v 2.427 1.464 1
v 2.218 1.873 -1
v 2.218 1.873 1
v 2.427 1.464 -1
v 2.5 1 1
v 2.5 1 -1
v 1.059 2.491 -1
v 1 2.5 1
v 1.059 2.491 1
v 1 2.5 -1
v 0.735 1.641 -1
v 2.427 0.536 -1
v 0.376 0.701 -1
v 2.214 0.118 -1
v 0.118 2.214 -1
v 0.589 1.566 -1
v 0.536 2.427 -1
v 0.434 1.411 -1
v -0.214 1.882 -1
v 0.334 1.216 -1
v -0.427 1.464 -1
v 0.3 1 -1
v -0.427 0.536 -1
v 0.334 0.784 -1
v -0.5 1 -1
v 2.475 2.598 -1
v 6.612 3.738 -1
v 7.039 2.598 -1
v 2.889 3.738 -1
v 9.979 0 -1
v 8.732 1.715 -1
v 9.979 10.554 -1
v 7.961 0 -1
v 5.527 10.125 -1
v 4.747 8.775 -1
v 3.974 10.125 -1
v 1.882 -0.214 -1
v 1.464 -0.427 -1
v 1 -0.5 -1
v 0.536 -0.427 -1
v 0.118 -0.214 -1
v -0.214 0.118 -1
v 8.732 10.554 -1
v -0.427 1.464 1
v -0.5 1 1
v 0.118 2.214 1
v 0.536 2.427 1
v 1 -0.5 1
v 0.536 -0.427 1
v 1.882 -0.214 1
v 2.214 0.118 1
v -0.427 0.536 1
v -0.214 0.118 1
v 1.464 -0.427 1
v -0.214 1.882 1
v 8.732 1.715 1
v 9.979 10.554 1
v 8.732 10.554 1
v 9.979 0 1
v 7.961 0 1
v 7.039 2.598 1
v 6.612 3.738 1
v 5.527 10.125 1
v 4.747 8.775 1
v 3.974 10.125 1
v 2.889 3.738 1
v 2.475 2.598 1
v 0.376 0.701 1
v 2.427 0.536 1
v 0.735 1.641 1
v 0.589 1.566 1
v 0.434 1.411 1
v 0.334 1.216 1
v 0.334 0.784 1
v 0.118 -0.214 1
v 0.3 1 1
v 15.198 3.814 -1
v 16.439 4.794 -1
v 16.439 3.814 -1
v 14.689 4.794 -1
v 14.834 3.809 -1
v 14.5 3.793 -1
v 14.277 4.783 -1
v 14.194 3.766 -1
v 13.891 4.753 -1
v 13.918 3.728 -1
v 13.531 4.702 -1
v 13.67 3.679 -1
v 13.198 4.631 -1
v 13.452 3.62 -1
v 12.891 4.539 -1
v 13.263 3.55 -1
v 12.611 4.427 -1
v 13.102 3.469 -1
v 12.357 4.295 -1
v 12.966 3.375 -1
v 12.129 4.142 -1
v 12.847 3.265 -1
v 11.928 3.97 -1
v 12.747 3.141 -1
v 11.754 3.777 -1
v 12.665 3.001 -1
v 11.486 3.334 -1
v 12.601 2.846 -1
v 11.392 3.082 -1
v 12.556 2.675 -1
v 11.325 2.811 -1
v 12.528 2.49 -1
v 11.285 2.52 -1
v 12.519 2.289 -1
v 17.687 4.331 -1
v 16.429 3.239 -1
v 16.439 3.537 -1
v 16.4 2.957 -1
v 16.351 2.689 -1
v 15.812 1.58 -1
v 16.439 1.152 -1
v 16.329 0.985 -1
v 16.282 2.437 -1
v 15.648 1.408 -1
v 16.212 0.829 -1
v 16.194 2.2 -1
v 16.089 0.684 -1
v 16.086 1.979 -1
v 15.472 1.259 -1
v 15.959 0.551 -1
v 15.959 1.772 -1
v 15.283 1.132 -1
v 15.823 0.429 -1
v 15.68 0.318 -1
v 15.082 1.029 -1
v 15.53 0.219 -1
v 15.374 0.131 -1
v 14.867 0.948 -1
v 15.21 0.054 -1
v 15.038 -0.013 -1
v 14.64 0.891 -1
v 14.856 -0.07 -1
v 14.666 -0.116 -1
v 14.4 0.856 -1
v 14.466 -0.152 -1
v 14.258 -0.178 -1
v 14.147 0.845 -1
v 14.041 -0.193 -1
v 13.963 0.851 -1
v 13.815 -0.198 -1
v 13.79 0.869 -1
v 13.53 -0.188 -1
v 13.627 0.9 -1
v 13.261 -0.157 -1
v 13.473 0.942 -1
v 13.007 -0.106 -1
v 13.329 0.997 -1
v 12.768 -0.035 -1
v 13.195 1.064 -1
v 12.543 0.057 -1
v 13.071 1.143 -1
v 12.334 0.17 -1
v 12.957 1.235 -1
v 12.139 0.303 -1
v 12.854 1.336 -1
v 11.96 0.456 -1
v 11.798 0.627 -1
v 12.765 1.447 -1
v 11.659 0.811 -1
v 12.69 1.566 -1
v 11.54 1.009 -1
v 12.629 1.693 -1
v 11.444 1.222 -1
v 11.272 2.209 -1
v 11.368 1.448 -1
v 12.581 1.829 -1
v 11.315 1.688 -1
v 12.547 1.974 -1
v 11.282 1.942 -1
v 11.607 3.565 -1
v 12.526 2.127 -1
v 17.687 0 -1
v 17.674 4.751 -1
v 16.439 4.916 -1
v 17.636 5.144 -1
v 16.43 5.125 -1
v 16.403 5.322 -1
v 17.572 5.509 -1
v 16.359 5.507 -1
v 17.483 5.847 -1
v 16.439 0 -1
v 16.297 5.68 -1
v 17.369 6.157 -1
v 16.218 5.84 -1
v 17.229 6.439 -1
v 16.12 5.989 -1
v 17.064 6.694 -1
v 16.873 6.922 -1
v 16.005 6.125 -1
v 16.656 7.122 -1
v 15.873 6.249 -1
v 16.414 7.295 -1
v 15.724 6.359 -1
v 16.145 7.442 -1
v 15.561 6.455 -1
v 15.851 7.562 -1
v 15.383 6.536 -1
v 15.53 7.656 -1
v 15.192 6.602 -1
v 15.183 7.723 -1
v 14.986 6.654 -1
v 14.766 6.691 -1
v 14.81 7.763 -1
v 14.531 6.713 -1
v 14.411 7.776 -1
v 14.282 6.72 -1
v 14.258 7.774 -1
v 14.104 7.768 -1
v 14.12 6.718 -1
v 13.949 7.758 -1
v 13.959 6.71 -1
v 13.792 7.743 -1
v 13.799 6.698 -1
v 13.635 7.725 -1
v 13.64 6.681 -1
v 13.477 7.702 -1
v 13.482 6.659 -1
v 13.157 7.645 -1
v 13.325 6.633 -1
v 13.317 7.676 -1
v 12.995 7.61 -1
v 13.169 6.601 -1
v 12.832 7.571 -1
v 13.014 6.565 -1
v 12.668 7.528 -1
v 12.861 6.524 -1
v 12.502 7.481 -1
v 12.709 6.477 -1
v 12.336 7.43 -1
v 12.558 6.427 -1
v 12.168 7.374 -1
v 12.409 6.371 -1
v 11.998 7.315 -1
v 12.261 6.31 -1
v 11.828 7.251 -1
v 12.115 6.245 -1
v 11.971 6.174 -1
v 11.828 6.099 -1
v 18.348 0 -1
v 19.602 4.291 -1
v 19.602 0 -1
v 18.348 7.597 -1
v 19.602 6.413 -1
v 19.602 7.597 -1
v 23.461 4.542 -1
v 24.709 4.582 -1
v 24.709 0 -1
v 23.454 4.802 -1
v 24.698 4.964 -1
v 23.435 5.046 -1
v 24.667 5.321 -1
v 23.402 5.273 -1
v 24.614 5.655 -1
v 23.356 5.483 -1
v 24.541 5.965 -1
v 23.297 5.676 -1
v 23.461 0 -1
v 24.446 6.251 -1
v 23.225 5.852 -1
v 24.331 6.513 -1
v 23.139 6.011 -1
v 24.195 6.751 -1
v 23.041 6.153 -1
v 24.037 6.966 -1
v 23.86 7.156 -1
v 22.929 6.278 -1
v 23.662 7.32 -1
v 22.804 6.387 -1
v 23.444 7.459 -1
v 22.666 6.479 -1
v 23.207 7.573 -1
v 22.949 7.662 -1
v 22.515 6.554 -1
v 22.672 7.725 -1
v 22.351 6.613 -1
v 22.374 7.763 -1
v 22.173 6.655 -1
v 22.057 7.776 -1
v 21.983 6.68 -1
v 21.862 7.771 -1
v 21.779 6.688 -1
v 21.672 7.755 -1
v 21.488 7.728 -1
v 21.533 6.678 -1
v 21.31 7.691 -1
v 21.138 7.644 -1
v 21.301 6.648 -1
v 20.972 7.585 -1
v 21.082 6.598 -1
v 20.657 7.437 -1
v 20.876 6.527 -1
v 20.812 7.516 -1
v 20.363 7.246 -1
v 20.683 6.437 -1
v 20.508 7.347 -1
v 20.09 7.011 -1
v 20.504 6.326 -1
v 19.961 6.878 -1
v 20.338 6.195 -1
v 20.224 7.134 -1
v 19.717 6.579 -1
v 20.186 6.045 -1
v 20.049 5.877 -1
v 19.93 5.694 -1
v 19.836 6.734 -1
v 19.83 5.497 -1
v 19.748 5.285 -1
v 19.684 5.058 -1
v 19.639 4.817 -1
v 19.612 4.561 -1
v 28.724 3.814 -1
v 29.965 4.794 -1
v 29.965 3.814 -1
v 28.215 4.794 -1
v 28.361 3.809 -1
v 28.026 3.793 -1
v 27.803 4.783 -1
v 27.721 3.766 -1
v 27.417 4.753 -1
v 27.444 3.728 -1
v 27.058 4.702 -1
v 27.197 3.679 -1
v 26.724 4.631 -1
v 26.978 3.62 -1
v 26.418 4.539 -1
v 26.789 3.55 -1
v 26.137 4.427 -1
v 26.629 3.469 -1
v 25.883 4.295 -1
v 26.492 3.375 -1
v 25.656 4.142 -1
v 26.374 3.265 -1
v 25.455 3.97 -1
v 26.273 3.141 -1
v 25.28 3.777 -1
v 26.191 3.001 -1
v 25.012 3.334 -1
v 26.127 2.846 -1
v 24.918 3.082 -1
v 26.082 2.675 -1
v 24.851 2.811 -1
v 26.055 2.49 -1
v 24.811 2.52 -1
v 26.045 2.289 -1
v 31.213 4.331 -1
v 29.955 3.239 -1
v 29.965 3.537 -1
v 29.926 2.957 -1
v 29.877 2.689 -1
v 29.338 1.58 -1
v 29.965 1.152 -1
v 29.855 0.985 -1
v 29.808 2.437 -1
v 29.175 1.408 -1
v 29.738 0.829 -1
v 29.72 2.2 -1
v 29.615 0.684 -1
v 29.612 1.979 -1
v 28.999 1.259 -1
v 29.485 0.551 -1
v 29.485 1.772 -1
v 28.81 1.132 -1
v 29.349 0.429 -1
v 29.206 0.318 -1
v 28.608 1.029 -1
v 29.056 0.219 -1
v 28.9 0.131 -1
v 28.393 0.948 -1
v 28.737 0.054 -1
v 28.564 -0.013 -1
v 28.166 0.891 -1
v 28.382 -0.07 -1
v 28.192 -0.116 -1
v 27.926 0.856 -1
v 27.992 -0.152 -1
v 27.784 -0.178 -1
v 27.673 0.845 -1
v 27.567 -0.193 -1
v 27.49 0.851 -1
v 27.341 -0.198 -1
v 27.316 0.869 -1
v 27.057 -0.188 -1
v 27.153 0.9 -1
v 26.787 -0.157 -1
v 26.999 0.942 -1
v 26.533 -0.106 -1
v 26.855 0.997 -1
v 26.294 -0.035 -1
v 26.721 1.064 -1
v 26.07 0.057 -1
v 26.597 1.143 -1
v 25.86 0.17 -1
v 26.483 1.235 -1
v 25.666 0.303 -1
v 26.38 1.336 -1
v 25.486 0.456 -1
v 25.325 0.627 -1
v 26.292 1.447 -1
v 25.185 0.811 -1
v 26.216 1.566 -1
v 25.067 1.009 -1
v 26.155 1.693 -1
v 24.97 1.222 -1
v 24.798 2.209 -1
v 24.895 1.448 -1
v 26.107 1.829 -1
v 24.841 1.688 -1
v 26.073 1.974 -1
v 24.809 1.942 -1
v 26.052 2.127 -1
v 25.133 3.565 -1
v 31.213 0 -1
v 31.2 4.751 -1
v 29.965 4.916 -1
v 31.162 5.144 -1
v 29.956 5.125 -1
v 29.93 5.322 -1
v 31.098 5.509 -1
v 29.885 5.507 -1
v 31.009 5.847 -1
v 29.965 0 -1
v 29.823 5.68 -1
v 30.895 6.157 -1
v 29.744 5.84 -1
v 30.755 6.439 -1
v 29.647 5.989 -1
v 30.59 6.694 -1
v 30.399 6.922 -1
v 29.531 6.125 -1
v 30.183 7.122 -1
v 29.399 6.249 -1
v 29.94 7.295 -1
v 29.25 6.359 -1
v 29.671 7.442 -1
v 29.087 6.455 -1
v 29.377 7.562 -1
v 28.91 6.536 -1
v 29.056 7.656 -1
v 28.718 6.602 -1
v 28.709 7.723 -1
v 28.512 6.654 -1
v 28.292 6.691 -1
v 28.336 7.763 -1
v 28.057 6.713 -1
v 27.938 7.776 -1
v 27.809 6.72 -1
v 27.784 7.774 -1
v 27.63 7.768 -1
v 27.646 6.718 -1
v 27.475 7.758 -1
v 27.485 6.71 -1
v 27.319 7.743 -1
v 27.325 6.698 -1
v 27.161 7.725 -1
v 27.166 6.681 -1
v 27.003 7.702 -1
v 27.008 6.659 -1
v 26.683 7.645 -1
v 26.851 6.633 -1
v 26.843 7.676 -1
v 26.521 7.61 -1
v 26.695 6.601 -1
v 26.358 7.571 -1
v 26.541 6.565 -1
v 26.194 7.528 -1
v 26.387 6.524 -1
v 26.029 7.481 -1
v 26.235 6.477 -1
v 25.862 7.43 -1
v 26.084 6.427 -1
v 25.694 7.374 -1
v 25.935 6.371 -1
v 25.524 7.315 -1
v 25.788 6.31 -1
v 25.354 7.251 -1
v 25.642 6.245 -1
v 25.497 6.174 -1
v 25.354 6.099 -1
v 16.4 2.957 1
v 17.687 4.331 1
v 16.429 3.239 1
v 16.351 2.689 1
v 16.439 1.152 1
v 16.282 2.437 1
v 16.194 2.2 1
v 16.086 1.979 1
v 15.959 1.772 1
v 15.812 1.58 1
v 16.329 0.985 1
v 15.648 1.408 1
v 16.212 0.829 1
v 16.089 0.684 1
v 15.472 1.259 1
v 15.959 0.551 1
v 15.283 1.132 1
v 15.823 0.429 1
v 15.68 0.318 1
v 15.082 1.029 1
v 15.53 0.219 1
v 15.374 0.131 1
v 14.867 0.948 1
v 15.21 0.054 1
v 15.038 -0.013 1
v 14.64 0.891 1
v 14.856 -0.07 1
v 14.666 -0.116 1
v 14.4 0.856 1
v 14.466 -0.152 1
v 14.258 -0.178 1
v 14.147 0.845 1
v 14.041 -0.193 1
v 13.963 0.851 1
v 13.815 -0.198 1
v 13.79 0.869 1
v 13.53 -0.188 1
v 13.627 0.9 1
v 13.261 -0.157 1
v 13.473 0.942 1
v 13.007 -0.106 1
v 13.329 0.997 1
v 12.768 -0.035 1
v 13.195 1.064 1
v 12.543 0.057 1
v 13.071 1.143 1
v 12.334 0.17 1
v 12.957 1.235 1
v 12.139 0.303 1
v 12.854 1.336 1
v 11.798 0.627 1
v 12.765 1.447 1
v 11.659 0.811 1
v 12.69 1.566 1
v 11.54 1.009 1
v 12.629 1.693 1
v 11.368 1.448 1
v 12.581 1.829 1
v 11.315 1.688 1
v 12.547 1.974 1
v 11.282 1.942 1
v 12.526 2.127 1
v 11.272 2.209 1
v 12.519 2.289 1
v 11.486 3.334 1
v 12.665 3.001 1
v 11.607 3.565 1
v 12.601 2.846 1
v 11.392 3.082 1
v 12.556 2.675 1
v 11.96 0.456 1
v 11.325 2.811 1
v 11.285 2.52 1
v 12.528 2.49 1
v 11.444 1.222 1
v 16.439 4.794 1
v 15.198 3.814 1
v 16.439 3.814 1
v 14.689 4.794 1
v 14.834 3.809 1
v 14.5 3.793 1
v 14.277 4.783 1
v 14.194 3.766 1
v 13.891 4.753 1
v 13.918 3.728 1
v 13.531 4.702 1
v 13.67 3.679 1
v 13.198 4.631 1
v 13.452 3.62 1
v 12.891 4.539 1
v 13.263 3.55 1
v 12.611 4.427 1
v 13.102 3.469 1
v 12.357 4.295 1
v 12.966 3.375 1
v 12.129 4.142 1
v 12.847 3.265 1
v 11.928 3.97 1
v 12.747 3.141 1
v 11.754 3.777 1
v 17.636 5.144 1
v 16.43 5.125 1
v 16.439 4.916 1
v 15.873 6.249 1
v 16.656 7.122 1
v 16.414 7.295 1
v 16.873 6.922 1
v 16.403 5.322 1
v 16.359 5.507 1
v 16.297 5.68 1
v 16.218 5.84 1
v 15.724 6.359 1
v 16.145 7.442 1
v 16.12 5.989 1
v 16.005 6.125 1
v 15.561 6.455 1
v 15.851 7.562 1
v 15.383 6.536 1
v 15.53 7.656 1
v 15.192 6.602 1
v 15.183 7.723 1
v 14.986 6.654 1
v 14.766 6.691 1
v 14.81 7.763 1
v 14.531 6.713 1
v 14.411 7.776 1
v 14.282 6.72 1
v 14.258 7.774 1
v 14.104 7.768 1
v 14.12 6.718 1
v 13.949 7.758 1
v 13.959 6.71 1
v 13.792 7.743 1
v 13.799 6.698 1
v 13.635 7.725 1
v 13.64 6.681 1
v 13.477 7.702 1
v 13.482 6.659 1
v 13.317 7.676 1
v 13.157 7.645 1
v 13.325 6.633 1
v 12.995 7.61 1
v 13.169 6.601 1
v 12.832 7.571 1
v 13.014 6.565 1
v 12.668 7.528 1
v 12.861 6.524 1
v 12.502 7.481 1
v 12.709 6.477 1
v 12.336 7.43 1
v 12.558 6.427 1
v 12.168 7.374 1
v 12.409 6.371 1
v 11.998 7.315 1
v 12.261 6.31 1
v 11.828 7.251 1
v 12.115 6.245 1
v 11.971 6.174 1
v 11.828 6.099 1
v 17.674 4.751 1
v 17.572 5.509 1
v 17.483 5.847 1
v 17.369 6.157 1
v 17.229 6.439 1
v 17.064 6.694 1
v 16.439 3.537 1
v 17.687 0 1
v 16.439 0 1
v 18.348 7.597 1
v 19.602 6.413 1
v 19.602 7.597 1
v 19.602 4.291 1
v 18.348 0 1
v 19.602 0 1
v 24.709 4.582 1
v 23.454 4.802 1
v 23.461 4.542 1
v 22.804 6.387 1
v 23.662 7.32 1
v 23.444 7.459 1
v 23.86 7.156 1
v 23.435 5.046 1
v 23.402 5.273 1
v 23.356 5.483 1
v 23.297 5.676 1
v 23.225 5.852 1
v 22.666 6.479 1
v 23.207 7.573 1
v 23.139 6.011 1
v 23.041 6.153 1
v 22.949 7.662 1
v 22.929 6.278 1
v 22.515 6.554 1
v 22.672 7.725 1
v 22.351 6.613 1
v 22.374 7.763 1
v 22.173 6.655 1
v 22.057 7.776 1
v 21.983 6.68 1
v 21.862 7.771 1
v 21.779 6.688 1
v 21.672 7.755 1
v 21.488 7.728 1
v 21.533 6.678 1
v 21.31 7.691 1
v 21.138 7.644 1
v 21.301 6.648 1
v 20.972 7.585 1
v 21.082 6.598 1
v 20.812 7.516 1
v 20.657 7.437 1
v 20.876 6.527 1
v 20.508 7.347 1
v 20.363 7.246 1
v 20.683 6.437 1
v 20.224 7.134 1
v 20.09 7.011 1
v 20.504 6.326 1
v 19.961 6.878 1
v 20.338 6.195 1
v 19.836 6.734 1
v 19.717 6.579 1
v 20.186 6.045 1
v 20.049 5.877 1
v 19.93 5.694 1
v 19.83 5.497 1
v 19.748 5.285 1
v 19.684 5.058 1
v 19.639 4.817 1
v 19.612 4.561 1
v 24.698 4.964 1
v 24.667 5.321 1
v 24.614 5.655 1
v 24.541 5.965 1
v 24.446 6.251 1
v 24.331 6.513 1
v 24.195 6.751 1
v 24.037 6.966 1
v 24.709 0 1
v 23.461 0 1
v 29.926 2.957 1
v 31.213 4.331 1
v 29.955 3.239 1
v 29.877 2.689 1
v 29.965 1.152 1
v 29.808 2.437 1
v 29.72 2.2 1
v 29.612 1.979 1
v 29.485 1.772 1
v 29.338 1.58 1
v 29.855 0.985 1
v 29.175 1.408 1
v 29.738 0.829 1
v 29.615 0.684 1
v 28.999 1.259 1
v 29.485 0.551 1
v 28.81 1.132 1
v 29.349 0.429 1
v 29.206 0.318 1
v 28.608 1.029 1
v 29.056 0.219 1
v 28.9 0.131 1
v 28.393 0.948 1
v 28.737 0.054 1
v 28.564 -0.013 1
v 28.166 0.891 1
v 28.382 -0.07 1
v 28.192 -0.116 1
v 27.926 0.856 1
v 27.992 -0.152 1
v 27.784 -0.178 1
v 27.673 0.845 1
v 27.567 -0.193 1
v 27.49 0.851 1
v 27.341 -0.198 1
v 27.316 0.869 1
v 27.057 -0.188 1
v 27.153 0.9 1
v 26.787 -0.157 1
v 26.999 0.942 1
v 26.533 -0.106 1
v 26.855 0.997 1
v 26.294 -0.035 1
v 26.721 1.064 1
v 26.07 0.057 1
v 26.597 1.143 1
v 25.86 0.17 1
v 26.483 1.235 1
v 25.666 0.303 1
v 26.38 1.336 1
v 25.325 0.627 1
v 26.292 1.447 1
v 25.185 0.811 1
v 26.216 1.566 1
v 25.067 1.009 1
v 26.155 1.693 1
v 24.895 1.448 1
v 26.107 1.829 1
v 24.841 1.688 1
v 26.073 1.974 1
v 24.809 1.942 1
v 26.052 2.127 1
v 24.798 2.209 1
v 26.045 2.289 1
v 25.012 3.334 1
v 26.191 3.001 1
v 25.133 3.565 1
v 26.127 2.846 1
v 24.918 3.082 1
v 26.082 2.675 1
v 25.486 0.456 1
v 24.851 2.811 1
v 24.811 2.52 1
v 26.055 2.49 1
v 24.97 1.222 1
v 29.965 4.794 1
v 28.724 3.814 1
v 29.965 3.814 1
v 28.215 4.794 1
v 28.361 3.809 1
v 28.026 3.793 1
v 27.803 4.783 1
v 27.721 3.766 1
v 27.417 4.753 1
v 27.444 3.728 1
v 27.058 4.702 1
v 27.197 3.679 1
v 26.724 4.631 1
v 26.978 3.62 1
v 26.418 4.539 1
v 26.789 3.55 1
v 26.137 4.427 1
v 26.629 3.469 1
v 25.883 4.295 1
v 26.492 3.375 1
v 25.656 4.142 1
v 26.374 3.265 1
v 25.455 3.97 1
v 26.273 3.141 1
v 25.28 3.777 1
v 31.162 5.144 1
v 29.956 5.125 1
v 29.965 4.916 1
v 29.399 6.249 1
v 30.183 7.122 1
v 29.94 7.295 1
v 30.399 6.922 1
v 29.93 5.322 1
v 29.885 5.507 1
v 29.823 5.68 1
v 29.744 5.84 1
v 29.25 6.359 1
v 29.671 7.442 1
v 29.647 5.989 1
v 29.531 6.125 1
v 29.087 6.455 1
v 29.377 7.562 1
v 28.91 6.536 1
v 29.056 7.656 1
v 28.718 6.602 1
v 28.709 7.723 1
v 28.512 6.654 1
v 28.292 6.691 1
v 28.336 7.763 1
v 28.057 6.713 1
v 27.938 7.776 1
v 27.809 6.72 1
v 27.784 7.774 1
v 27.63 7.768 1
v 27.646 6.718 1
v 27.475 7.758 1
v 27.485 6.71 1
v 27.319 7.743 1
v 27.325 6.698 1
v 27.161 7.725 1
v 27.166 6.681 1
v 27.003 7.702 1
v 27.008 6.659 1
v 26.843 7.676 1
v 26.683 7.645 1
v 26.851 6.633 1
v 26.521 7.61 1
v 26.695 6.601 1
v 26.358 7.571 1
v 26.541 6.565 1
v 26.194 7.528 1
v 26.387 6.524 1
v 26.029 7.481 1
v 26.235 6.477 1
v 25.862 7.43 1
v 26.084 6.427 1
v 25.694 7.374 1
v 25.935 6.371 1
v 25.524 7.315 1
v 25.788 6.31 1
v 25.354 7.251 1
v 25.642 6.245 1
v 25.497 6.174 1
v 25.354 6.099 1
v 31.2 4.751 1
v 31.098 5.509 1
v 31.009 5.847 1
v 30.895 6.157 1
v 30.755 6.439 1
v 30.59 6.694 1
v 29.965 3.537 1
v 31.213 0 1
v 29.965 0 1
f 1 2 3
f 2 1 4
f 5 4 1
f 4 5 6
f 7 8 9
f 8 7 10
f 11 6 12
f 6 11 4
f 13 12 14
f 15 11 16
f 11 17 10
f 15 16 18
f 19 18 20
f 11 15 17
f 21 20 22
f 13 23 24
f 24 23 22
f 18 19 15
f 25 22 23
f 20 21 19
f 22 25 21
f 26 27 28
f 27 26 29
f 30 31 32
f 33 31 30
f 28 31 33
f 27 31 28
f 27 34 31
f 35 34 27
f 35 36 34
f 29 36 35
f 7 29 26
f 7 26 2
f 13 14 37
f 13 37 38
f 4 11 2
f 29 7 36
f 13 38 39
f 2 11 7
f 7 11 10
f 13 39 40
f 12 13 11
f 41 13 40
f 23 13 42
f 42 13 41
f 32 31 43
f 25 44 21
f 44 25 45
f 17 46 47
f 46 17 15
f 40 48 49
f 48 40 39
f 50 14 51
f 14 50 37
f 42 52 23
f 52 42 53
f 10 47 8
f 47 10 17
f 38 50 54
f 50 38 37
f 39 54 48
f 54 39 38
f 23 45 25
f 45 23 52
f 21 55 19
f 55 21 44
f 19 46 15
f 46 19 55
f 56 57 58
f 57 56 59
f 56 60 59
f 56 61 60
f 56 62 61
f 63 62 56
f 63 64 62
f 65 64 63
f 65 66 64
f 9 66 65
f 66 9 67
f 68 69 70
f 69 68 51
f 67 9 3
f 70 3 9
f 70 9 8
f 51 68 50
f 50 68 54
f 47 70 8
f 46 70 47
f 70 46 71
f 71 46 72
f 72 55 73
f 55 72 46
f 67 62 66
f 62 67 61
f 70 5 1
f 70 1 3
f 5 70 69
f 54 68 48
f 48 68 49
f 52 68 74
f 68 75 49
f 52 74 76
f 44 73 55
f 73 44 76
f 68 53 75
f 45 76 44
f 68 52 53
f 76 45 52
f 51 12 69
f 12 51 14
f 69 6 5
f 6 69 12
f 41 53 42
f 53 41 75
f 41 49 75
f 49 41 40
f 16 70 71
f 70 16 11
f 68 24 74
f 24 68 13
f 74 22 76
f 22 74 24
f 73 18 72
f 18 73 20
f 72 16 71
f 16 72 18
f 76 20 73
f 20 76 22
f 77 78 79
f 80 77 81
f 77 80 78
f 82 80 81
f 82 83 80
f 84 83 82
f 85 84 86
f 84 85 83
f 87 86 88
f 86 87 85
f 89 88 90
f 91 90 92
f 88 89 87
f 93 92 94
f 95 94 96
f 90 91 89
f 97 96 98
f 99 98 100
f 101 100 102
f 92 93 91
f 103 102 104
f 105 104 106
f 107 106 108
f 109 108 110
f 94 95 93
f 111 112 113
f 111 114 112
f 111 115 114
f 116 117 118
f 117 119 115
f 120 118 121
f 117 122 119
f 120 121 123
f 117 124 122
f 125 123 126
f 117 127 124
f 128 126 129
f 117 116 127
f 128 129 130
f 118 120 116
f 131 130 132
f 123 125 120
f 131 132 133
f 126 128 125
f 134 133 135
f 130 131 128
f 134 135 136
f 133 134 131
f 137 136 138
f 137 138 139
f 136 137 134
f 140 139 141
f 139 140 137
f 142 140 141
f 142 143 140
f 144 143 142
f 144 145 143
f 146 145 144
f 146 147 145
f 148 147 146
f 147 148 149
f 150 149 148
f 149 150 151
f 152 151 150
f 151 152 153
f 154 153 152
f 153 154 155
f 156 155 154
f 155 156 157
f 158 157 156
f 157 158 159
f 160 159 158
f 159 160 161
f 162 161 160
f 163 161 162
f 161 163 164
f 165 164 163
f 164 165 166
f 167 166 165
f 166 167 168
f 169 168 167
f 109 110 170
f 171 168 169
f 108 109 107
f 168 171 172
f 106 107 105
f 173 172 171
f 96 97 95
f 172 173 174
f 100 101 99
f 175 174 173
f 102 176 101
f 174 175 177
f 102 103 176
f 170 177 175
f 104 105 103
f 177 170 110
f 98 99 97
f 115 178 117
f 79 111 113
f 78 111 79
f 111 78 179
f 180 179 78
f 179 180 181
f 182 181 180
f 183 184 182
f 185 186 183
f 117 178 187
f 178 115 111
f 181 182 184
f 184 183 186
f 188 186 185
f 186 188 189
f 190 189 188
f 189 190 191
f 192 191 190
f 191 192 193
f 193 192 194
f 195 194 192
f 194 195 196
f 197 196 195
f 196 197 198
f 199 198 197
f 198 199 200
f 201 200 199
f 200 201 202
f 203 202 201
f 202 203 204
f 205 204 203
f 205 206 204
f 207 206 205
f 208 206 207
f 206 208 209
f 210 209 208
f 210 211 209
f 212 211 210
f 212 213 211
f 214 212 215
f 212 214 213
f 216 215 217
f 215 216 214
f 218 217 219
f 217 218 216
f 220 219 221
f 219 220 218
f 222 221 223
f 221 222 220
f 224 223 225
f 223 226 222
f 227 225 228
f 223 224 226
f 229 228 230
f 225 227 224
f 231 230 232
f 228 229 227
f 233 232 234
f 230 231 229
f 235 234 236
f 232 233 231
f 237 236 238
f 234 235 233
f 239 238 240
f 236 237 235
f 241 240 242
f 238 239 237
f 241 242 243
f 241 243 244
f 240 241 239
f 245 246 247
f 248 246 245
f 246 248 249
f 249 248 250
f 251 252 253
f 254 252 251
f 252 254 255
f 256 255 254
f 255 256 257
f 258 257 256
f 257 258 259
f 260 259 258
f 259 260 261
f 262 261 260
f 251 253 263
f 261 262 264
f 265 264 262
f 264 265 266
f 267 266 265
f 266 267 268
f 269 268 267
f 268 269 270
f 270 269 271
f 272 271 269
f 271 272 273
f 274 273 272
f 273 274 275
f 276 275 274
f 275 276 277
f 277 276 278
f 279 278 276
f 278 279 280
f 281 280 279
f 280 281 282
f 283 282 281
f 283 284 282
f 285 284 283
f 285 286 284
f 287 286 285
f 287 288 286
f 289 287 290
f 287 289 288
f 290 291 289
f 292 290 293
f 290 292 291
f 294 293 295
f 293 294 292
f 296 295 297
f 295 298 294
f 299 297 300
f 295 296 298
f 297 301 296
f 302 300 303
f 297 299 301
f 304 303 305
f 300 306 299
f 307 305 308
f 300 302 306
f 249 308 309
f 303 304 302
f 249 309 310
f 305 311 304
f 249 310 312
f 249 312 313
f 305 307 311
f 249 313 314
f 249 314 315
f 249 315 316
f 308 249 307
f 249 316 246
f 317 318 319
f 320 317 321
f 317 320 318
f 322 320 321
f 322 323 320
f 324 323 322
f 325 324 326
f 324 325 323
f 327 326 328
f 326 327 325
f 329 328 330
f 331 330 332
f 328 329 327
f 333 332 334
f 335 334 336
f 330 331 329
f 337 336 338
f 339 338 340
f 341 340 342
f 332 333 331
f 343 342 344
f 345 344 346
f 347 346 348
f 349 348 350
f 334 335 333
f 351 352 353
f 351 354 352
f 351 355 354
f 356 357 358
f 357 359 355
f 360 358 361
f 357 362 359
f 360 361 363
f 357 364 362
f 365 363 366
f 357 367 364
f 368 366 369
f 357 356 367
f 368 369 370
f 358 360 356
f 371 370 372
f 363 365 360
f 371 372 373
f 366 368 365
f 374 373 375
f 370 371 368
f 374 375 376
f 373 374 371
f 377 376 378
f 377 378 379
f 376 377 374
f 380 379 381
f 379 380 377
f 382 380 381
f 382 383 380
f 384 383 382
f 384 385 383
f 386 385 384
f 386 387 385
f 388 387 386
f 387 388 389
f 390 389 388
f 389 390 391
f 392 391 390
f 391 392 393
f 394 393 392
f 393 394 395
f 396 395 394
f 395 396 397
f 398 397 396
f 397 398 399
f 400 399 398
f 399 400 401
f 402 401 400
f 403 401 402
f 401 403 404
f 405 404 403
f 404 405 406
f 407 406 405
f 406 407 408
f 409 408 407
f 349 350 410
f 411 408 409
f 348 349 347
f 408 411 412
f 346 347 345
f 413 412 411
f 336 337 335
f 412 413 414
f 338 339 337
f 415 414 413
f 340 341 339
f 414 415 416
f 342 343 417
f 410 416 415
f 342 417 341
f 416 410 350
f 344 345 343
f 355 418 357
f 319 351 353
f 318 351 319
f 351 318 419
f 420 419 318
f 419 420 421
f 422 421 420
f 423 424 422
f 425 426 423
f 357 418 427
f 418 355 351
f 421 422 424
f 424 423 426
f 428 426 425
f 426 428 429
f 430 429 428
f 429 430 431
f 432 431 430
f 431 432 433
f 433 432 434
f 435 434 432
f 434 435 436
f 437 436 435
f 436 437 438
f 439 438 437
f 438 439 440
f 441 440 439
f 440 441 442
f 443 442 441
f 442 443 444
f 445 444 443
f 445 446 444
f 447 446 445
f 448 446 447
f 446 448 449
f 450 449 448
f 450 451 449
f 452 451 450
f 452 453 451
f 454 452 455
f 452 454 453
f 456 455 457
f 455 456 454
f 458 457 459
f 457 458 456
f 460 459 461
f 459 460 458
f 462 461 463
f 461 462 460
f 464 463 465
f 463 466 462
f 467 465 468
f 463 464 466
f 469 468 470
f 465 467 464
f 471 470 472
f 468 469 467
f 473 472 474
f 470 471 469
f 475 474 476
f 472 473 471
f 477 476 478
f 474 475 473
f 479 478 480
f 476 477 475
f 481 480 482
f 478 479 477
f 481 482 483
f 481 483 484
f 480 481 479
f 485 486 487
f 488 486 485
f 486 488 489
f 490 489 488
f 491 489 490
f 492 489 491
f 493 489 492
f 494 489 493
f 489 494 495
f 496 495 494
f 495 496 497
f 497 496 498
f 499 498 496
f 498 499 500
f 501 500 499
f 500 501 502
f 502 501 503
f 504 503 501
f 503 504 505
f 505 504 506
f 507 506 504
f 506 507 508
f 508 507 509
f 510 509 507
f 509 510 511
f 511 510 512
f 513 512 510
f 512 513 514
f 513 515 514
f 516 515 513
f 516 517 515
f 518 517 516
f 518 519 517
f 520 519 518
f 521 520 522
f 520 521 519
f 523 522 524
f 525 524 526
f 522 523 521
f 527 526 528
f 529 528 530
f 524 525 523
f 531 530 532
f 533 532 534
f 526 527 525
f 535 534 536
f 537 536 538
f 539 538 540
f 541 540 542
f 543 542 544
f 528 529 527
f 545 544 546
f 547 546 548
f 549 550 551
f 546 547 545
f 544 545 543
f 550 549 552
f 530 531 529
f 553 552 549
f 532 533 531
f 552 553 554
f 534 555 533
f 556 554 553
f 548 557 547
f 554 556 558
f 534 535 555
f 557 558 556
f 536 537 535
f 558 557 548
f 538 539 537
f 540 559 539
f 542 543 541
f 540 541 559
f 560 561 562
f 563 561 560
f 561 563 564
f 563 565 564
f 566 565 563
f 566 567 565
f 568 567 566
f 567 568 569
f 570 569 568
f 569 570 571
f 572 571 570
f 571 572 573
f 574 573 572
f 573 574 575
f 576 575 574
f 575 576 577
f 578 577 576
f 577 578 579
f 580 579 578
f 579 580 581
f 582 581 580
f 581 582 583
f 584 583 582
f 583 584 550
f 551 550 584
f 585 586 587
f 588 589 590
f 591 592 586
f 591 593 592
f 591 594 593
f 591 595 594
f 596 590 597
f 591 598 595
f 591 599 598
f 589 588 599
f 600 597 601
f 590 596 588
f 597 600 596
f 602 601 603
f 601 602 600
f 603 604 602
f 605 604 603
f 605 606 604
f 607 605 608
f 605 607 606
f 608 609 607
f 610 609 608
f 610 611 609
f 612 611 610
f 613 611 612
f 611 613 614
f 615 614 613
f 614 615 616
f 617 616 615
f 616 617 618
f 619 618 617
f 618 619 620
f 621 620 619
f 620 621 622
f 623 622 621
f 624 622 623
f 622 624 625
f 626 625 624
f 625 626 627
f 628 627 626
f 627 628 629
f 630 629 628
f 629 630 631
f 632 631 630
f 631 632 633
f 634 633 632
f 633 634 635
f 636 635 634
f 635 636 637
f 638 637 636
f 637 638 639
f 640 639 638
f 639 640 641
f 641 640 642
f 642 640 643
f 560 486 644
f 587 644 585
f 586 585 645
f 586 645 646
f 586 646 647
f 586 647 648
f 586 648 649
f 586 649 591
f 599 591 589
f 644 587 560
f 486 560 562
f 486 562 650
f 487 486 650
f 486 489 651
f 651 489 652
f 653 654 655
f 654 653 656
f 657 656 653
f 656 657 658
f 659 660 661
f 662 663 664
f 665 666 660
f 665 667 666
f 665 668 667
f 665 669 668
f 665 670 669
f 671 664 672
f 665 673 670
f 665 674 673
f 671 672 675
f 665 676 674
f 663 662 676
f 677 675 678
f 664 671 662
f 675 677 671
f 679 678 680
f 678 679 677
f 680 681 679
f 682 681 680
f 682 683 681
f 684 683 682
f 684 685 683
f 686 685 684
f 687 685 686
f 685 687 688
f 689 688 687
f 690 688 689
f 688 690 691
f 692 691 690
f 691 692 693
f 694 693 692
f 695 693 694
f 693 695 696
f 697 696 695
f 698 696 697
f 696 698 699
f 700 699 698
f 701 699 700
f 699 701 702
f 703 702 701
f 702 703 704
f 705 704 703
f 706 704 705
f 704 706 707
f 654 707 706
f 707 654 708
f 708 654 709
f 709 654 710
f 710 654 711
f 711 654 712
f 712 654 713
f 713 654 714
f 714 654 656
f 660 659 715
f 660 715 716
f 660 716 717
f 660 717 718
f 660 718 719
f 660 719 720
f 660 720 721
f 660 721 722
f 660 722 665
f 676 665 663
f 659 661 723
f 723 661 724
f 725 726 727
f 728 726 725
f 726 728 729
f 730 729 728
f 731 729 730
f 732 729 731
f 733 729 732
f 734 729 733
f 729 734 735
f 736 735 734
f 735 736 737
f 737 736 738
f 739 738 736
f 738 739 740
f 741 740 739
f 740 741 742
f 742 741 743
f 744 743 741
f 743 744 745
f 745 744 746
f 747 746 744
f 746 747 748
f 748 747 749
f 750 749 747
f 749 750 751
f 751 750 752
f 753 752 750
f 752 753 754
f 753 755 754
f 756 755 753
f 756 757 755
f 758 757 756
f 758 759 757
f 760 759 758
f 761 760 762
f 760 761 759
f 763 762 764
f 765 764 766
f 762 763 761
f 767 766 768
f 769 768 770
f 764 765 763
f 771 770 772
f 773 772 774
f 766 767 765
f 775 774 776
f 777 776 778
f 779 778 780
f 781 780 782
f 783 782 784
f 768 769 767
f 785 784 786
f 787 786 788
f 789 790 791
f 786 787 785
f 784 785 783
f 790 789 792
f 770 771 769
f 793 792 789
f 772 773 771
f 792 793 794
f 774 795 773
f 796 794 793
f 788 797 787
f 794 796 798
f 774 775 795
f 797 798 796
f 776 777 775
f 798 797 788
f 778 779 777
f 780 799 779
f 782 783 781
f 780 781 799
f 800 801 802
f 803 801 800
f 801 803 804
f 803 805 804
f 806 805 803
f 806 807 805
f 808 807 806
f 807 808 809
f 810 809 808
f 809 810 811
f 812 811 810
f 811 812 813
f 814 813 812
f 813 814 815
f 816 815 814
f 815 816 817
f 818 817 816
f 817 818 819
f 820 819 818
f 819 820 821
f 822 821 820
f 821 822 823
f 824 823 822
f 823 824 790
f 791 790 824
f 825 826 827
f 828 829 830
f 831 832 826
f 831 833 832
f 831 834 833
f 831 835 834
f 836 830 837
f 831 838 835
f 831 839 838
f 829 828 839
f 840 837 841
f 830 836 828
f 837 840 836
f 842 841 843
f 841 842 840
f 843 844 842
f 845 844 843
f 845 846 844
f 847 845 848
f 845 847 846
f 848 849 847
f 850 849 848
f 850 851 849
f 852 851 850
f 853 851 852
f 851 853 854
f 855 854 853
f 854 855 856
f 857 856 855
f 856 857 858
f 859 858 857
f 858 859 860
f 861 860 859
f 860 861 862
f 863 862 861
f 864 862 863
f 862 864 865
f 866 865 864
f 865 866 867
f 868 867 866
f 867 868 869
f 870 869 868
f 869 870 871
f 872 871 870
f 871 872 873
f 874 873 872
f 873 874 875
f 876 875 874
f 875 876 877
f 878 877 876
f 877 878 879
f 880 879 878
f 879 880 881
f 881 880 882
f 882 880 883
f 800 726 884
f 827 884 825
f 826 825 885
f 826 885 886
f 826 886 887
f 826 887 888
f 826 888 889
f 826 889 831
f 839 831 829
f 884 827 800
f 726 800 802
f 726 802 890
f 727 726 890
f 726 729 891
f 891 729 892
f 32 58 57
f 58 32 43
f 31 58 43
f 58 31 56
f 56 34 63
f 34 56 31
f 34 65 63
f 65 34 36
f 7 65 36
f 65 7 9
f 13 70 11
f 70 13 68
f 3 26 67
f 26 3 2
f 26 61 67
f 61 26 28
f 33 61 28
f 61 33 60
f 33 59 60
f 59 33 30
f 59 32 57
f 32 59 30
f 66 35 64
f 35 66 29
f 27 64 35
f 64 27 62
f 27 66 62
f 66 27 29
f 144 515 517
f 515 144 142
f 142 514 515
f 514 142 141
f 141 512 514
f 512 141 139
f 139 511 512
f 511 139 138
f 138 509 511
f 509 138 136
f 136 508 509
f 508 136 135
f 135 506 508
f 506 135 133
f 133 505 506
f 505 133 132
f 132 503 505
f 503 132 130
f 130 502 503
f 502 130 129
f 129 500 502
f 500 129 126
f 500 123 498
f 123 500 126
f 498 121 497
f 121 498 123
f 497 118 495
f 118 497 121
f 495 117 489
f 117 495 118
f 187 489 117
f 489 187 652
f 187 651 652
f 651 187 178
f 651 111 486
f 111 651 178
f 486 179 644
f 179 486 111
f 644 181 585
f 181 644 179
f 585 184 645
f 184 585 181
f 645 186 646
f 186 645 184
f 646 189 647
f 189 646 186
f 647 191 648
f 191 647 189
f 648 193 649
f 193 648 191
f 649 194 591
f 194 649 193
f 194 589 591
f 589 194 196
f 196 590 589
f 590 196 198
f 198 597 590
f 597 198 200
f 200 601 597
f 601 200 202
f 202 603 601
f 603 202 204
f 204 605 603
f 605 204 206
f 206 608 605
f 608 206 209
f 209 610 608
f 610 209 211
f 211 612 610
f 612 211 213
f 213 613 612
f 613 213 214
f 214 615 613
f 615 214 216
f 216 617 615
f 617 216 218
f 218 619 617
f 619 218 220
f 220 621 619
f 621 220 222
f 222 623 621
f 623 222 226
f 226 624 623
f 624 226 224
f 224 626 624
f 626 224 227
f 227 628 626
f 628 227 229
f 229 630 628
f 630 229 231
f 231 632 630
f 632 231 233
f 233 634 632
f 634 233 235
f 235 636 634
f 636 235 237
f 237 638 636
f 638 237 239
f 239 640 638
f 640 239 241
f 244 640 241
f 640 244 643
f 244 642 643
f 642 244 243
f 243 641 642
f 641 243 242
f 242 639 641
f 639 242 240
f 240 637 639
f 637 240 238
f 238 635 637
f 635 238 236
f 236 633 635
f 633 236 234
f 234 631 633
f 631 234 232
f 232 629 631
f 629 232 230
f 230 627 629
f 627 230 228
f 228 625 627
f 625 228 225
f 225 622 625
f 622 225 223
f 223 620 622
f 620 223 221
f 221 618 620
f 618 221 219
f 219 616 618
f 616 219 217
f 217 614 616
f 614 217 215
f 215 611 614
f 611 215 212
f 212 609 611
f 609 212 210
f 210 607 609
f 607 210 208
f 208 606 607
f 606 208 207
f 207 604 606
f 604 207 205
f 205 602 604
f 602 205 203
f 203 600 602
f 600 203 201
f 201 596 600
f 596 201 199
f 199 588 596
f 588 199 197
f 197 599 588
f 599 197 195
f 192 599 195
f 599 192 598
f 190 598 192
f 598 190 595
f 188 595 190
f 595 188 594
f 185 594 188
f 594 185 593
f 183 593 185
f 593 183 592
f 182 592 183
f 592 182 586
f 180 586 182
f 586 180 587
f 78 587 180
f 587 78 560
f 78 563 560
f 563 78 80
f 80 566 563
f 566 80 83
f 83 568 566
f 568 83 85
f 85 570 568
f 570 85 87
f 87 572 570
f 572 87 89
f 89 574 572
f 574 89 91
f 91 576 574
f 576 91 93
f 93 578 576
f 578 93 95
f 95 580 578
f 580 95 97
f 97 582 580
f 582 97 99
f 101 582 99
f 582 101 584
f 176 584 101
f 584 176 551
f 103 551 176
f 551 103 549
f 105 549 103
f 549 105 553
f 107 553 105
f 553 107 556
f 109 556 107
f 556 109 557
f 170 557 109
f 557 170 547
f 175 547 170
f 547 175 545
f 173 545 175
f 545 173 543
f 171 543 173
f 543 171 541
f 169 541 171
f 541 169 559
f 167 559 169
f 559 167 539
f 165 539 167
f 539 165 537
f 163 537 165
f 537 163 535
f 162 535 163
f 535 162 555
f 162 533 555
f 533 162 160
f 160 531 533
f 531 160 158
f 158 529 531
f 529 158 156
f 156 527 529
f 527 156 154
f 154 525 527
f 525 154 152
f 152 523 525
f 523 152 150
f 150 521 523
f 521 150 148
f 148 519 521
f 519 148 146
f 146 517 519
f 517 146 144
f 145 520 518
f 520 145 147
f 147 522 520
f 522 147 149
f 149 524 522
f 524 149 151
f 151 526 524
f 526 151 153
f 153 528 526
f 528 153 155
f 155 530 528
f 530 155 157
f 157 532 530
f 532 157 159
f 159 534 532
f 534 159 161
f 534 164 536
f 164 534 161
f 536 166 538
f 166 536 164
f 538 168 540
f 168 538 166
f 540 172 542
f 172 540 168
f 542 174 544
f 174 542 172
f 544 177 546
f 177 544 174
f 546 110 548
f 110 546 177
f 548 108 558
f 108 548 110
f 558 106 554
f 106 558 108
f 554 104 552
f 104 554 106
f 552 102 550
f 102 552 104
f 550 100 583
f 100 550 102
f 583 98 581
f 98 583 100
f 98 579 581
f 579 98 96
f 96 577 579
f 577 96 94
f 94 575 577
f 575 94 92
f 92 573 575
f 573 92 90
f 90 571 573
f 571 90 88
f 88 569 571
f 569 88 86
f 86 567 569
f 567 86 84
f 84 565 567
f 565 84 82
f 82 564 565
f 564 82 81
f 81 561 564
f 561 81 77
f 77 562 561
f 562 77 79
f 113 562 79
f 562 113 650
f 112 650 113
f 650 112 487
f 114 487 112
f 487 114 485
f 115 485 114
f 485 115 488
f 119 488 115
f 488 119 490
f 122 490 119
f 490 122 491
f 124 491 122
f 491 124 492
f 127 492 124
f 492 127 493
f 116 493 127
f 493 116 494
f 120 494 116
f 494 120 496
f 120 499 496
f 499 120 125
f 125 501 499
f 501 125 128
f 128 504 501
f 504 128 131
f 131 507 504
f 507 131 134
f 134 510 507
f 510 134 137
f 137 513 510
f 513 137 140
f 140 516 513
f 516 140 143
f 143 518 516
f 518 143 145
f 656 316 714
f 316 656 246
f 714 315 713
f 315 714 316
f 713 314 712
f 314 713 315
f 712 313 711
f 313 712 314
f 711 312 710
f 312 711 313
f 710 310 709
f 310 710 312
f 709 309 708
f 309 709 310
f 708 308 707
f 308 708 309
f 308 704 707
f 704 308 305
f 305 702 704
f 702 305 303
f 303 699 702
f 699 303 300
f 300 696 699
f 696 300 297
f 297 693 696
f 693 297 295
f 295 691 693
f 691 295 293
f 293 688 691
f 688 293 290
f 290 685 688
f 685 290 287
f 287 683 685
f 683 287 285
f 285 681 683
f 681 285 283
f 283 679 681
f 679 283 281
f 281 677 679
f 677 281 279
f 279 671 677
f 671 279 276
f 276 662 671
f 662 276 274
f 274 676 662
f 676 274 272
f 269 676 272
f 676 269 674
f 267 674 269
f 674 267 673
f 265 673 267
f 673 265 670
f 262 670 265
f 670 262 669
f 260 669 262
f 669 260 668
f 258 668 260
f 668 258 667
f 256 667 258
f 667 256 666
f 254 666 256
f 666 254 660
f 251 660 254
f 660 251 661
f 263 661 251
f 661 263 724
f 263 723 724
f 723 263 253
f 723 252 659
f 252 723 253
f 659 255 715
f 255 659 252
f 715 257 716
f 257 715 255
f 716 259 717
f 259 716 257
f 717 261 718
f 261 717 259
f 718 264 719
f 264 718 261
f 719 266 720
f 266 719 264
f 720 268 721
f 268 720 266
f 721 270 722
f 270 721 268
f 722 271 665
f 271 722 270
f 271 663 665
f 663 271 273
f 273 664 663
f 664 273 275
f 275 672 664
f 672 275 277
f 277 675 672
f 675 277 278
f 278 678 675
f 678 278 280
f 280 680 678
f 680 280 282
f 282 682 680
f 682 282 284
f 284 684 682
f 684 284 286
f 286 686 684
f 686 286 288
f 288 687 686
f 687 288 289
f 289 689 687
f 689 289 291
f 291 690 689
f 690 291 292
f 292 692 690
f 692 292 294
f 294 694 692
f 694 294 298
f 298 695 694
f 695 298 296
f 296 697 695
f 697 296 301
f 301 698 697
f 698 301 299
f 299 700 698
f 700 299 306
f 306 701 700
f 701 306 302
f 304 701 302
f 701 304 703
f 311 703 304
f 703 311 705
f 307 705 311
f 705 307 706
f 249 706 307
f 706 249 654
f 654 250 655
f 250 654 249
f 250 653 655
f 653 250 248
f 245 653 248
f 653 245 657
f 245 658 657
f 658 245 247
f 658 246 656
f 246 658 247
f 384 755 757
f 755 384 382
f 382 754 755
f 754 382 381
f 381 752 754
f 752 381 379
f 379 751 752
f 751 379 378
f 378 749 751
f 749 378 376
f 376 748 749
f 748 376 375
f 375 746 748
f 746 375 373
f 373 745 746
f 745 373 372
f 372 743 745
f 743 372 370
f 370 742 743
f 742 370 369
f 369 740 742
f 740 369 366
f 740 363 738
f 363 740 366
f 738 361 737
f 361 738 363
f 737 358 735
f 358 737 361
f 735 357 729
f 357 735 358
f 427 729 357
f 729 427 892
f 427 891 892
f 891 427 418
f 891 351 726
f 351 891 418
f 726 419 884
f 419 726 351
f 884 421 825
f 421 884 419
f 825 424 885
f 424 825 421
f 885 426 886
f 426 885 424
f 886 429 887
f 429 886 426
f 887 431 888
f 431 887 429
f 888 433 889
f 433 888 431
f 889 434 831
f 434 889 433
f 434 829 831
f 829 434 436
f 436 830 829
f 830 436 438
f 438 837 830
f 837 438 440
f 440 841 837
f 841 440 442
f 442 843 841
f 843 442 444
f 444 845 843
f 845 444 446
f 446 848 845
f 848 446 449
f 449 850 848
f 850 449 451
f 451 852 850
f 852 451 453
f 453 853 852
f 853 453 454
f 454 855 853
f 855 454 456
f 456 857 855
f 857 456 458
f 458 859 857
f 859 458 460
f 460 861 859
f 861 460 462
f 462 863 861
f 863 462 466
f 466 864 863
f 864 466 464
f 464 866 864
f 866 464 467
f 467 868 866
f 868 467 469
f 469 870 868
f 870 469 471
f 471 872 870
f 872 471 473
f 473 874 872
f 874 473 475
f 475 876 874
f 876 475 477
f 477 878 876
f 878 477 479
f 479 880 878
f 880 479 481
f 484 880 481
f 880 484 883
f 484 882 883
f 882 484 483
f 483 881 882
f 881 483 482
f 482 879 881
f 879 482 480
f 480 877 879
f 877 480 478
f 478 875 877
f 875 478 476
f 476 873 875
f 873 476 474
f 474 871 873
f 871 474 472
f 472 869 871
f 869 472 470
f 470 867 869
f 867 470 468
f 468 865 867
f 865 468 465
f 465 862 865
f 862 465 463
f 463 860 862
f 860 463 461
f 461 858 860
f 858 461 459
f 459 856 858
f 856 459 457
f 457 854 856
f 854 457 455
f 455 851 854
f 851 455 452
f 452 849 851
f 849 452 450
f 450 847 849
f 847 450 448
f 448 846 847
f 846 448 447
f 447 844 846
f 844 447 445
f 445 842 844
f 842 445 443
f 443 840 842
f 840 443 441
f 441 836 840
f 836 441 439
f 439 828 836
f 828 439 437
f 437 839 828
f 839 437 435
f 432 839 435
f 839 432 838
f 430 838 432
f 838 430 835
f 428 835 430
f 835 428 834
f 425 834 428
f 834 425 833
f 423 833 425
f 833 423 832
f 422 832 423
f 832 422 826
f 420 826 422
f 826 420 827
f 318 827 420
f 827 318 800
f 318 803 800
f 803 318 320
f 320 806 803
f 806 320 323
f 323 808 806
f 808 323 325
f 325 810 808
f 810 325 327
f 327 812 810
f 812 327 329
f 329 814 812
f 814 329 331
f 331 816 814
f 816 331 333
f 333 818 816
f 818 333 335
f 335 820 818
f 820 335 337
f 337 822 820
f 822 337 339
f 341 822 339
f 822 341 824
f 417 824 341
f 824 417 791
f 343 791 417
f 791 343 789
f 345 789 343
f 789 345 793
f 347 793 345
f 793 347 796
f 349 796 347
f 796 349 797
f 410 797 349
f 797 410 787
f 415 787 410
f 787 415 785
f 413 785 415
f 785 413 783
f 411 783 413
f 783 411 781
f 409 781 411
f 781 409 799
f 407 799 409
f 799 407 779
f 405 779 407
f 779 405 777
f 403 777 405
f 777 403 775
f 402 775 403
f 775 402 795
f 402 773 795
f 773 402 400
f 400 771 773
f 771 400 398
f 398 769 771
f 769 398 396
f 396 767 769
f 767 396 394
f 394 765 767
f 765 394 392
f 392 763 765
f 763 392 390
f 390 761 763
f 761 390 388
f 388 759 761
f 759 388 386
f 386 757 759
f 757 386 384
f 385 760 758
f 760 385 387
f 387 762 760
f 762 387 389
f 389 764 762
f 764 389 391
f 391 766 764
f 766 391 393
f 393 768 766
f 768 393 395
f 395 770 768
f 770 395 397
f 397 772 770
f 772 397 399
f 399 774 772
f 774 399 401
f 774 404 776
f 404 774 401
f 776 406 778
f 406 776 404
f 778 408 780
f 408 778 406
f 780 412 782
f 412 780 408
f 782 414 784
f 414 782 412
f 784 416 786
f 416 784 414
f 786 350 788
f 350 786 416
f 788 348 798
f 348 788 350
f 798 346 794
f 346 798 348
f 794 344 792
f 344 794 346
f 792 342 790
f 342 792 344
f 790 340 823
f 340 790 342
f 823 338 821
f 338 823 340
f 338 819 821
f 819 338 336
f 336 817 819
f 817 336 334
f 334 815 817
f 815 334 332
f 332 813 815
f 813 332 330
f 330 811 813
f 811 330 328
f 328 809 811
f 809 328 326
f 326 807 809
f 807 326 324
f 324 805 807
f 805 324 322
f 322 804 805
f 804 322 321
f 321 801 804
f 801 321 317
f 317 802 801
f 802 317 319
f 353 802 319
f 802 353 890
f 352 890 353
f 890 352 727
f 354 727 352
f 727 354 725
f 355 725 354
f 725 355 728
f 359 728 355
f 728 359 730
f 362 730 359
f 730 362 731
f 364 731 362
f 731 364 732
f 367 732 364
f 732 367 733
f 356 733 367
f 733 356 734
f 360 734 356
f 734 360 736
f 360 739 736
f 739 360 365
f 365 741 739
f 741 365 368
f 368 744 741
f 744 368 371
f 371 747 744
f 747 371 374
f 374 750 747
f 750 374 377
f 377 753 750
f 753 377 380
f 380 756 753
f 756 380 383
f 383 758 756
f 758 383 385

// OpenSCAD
/* text("Alana", font = "Colourbars:style=Bold Italic", size="25",spacing=0.9);
 translate([0,15,0])text("Alana", font = "Mail Ray Stuff:style=Bold Italic", size="25",spacing=0.9);
  translate([0,45,0])text("Alana", font = "Sloe Gin Rickey:style=Bold Italic", size="25");
 translate([8,60,0])rotate([0,180,0])text("A", font = "Mail Ray Stuff:style=Bold Italic", size="25");
 translate([6,60,0])text("lana", font = "Sloe Gin Rickey:style=Bold Italic", size="25");
 */
 
 $fn=60;
 translate([0,0,0])linear_extrude(height=2, center=true)text("Alana", font = "Minya Nouvelle:style=Bold Italic", size="25",spacing=0.80);

translate([1,1,0])
difference(){
    cylinder(r=1.5,h=2, center=true, $fn=20);
    cylinder(r=0.7,h=3, center=true, $fn=20);
}
